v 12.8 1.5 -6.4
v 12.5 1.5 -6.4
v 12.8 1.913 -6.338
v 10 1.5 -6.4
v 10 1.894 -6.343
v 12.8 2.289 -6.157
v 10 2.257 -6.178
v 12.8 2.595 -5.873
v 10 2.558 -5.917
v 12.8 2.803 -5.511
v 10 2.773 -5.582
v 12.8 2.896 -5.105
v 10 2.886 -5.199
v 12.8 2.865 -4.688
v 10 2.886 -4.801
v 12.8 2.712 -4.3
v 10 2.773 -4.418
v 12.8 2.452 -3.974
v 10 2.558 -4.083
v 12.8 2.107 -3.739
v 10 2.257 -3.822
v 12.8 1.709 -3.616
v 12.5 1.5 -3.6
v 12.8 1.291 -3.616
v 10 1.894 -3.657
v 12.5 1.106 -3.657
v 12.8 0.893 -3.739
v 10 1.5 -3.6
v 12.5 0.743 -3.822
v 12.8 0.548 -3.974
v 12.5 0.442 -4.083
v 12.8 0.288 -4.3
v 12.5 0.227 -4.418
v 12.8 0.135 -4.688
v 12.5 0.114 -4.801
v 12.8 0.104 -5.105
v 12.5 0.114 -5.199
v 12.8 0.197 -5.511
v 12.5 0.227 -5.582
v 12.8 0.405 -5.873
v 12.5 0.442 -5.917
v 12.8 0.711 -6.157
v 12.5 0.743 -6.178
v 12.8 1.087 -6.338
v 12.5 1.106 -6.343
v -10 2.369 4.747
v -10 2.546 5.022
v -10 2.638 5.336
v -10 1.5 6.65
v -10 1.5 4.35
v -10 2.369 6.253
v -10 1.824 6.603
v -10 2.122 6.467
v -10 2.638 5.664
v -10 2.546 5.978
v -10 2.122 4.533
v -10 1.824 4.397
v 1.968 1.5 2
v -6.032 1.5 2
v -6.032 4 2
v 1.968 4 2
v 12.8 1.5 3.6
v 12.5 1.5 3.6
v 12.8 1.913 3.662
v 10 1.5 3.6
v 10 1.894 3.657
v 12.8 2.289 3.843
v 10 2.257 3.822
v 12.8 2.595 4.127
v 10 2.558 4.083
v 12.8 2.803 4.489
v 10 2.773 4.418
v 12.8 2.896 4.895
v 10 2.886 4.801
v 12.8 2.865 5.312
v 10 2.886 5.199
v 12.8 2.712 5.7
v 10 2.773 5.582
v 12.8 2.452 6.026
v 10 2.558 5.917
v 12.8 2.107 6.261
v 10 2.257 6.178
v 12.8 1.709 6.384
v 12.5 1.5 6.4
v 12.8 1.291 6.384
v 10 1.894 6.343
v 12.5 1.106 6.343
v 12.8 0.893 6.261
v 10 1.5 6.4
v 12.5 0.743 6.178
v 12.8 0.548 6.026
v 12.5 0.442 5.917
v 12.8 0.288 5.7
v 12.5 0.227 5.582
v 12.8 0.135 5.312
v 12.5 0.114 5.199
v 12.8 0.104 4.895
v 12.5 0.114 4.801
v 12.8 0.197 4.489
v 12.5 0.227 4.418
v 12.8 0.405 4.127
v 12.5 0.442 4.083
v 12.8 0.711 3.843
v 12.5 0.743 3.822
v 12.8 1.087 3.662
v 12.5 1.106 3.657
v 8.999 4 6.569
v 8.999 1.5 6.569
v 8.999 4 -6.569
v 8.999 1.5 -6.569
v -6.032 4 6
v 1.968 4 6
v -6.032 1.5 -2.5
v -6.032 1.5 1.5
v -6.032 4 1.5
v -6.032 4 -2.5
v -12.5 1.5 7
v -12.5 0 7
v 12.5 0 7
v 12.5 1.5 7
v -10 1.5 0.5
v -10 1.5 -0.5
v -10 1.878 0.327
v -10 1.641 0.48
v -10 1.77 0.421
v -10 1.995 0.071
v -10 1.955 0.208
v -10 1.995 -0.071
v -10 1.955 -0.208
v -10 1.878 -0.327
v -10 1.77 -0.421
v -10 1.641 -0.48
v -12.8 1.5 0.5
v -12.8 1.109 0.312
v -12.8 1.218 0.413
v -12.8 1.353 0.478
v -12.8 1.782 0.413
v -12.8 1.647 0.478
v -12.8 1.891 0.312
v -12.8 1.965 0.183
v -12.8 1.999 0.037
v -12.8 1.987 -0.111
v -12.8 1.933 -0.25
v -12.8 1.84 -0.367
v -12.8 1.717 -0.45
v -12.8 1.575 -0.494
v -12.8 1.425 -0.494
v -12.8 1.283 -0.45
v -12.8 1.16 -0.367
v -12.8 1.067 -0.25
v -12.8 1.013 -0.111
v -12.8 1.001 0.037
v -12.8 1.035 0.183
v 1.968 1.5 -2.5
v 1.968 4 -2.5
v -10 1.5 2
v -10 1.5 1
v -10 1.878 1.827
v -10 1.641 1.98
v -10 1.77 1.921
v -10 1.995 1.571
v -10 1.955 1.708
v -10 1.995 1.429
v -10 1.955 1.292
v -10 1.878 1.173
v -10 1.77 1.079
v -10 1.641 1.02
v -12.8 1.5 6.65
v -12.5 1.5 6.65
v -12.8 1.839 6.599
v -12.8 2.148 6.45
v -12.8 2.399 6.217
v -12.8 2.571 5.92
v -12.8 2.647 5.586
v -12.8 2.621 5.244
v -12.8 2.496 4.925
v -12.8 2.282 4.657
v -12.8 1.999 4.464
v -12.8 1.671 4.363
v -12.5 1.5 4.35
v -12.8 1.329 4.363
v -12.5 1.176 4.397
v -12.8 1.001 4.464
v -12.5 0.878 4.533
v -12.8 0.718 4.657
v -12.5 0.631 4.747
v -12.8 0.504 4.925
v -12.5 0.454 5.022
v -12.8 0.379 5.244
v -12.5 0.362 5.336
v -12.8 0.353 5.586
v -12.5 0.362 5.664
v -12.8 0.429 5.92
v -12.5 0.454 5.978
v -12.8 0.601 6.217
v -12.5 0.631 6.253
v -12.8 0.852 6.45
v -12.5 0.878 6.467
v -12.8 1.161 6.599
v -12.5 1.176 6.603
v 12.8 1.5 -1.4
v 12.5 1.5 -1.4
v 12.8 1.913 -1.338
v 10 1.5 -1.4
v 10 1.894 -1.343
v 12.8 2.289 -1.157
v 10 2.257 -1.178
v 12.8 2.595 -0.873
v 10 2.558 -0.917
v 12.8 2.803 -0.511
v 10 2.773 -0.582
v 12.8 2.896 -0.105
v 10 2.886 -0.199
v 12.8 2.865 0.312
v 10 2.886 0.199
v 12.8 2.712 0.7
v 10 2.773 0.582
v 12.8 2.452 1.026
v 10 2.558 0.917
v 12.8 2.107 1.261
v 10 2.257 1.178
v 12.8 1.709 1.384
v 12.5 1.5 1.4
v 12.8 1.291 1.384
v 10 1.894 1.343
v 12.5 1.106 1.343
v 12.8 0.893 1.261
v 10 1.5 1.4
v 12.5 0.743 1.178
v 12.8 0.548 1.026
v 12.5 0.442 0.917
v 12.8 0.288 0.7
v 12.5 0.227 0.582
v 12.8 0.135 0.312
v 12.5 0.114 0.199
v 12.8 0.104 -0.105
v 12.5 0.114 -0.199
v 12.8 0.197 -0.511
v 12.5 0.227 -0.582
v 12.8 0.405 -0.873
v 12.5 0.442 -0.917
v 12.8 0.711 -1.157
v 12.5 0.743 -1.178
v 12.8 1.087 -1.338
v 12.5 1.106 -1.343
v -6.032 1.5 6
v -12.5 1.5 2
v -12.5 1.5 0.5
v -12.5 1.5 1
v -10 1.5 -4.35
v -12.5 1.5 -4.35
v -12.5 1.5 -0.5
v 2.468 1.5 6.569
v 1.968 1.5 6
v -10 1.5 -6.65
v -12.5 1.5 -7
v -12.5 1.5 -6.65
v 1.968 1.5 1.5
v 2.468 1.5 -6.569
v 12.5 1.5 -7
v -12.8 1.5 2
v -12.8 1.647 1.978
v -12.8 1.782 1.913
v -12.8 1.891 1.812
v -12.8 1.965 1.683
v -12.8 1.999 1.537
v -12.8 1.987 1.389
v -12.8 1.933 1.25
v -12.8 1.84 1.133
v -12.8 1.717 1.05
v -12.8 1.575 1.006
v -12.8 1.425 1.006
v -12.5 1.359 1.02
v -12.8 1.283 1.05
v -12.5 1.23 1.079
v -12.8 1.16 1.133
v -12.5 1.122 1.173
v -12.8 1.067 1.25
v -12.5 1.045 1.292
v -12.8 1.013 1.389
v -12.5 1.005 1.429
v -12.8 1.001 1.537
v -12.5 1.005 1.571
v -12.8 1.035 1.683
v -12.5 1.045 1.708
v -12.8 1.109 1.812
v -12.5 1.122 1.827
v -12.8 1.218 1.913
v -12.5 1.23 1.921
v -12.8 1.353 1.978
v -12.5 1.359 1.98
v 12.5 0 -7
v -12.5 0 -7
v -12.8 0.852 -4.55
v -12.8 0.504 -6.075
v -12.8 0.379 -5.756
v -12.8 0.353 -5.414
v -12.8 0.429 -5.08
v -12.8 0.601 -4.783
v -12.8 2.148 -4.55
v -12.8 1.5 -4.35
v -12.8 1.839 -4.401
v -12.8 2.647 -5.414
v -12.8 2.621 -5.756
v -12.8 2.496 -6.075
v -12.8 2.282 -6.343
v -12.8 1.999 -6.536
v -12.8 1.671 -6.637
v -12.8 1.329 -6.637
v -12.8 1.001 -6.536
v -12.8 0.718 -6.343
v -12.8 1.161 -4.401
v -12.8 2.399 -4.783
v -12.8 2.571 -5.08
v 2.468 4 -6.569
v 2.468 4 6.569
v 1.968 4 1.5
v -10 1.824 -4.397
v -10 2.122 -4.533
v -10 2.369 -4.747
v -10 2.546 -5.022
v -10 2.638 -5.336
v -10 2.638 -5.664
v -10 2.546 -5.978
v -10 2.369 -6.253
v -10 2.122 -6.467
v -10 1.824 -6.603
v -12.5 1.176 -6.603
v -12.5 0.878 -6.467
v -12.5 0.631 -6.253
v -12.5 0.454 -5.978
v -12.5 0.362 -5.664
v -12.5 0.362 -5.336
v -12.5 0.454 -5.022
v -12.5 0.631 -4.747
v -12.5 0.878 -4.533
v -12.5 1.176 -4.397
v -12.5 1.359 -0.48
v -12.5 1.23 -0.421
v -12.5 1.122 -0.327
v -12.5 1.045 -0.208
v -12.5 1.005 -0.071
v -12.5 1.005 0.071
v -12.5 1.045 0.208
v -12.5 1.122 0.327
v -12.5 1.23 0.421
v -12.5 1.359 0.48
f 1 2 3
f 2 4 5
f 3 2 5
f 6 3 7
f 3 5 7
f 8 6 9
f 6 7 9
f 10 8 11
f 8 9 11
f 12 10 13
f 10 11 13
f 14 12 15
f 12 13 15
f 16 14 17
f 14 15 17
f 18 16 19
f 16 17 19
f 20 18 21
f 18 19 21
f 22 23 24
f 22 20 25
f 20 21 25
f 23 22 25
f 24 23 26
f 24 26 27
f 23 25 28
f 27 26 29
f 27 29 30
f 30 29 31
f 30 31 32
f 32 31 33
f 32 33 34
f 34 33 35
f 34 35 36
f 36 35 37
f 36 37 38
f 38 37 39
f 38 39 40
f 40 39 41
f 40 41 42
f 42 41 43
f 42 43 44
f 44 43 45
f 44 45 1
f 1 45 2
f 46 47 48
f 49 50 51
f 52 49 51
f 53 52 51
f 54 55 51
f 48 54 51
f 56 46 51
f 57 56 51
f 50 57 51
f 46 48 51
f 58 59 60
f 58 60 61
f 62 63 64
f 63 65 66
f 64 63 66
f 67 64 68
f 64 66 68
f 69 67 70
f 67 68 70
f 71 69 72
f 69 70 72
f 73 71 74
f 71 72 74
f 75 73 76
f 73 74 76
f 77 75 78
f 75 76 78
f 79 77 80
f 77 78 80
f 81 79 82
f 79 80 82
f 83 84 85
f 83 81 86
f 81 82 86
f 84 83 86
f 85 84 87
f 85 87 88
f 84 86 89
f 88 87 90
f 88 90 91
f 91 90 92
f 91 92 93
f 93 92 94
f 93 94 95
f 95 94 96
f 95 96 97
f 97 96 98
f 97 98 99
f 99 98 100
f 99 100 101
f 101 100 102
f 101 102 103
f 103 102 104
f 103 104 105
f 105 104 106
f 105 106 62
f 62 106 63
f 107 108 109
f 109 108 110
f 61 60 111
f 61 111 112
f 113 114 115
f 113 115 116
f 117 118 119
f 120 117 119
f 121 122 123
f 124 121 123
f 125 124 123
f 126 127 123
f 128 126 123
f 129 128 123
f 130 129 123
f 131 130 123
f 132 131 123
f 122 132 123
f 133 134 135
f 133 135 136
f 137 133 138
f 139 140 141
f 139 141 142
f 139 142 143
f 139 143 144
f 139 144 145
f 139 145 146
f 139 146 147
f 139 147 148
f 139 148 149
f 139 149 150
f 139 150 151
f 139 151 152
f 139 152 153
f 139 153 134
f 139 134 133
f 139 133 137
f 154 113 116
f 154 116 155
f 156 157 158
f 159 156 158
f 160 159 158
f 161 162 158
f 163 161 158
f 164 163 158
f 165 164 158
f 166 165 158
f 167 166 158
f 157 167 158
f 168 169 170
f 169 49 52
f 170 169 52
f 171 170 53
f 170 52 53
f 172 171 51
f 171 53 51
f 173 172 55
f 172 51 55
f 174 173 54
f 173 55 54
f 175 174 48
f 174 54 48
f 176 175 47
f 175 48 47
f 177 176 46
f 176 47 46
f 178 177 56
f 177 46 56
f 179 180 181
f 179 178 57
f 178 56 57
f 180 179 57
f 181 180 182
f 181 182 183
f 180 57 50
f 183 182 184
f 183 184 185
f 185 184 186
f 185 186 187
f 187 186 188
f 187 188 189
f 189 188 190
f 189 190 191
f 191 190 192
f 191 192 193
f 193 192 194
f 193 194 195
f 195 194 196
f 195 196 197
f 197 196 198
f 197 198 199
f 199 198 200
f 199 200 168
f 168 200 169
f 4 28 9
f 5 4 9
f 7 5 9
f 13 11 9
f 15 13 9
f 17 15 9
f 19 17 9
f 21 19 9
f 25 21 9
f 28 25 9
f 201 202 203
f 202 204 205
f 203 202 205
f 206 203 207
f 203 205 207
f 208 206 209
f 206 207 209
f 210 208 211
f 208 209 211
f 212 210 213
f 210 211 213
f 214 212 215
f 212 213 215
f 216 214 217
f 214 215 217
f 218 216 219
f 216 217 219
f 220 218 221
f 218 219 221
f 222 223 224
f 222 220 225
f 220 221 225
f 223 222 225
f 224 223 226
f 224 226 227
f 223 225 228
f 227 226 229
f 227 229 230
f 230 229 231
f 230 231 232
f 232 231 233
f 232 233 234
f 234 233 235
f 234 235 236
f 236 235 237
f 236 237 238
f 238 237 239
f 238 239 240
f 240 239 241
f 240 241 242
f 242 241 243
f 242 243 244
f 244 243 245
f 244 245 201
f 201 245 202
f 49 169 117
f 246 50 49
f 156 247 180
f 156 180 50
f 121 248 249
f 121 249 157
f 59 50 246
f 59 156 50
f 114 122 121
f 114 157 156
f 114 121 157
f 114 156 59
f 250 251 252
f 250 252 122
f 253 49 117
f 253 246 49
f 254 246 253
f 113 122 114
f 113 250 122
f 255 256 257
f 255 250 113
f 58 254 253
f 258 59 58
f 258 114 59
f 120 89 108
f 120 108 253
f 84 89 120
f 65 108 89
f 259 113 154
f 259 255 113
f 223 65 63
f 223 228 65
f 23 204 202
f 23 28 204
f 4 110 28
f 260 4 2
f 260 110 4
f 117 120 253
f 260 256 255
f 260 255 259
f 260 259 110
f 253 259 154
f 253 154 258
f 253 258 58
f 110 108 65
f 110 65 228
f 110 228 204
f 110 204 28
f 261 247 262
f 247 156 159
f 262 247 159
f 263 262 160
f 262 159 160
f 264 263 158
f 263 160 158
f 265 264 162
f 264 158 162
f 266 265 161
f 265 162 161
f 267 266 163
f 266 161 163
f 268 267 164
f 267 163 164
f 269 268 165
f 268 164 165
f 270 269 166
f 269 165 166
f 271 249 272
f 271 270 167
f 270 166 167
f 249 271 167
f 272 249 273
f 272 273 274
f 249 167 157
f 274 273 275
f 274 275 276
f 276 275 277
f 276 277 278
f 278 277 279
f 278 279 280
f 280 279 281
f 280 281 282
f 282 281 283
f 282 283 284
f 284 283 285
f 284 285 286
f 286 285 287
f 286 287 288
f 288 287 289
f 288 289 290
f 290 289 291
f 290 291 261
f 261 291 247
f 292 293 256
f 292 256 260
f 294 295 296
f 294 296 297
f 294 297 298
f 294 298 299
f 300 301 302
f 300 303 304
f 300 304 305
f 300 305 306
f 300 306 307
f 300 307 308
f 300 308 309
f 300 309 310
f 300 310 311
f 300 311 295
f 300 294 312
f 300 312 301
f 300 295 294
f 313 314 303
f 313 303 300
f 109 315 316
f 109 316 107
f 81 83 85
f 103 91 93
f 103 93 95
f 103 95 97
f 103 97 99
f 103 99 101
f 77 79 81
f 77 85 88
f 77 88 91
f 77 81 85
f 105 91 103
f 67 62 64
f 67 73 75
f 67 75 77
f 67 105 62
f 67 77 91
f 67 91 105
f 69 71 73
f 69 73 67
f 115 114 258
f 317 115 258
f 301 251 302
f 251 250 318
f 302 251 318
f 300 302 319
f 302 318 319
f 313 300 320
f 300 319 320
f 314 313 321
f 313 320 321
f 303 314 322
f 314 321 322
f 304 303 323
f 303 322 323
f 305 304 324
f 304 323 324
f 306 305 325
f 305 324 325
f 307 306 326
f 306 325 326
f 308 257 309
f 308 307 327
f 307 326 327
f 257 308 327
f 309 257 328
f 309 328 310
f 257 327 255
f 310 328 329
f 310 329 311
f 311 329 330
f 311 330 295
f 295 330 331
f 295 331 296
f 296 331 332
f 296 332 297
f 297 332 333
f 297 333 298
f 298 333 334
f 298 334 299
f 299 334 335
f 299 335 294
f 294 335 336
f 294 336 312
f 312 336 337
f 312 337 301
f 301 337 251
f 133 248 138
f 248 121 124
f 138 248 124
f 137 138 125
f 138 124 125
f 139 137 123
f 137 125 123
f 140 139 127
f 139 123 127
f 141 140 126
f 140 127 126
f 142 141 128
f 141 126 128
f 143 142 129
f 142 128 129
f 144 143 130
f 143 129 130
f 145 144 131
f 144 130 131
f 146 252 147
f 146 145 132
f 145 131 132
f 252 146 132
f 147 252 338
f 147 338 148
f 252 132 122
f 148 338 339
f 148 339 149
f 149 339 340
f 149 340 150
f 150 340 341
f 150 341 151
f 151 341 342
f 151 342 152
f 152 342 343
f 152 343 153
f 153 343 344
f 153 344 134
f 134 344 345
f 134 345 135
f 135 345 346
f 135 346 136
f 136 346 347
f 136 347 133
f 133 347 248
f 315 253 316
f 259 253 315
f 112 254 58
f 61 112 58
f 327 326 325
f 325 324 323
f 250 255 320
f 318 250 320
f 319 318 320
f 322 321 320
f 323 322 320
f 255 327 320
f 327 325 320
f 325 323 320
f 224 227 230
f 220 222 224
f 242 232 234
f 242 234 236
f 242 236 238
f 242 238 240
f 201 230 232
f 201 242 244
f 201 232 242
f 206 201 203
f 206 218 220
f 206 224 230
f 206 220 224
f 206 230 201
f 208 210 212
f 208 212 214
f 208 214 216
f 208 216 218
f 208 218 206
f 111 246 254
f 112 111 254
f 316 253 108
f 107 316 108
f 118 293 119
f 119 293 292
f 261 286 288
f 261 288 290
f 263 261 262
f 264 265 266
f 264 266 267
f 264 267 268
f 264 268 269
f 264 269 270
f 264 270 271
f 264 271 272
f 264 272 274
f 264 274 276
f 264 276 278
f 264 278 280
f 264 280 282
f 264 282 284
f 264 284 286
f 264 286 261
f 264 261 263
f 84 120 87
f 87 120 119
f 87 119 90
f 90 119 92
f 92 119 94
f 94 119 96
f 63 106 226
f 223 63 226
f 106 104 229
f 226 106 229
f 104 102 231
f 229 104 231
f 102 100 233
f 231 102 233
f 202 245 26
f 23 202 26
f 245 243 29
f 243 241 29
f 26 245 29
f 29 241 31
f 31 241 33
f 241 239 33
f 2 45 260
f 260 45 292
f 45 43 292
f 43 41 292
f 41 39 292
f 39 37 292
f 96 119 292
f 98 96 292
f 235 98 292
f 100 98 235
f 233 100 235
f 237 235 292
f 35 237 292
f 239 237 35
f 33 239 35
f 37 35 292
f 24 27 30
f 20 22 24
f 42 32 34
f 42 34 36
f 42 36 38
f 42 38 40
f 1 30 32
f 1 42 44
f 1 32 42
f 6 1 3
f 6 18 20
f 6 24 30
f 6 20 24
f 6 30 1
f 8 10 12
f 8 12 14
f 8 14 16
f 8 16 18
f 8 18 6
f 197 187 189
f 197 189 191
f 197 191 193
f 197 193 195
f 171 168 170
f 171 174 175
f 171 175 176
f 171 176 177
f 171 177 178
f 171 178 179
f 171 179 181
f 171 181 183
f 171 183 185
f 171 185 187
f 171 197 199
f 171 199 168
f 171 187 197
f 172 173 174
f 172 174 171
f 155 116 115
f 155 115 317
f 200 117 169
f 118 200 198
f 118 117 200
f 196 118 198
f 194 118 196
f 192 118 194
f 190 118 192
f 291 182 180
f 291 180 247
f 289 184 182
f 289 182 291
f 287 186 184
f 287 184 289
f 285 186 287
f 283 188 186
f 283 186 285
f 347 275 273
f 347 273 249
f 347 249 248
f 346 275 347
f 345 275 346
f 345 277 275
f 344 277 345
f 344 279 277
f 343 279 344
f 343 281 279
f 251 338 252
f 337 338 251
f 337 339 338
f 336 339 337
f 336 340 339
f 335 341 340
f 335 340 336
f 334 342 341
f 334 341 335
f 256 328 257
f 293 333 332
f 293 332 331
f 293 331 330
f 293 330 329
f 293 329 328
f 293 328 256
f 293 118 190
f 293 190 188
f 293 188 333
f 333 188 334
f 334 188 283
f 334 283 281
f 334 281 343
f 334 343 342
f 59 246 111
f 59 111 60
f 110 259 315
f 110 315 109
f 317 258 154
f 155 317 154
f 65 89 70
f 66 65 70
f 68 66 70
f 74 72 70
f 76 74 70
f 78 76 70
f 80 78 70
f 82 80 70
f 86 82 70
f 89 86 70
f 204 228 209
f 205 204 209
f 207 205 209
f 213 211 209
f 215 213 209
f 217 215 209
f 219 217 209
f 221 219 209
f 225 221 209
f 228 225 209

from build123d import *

# Parameters (mm, degrees)
SKIZZE1_W            = 25
SKIZZE1_H            = 14
PLATINE_DEPTH        = 1.5
SKIZZE2_W            = 6.530722005
SKIZZE2_H            = 13.138578522
MOSFETS_DEPTH        = 2.5
SKIZZE4_W            = 8
SKIZZE4_H            = 4
WEITERE_ICS_DEPTH    = 2.5
LOT_MOTOR_DEPTH      = 0.3
LOT_MOTOR_DEPTH_BACK = 2.5
SKIZZE5_R            = 1.4
LOT_PDB_DEPTH        = 0.3
LOT_PDB_DEPTH_BACK   = 2.5
SKIZZE6_R            = 1.15
LOT_FC_DEPTH         = 0.3
LOT_FC_DEPTH_BACK    = 2.5
SKIZZE7_R            = 0.5


with BuildPart() as part:
    # Skizze1 → Platine (new body)
    with BuildSketch(Plane(origin=(0, 0, 0), x_dir=(1, 0, 0), z_dir=(0, 1, 0))):
        Rectangle(SKIZZE1_W, SKIZZE1_H)
    extrude(amount=PLATINE_DEPTH)

    # Skizze2 → MOSFETs (add)
    with BuildSketch(Plane(origin=(0, 1.5, 0), x_dir=(1, 0, 0), z_dir=(0, 1, 0))):
        with Locations((5.733665382, 0)):
            Rectangle(SKIZZE2_W, SKIZZE2_H)
    extrude(amount=MOSFETS_DEPTH)

    # Skizze4 → Weitere_ICs (add)
    with BuildSketch(Plane(origin=(0, 1.5, 0), x_dir=(1, 0, 0), z_dir=(0, 1, 0))):
        with Locations((-2.03169562, -4)):
            Rectangle(SKIZZE4_W, SKIZZE4_H)
        with Locations((-2.03169562, 0.5)):
            Rectangle(SKIZZE4_W, SKIZZE4_H)
    extrude(amount=WEITERE_ICS_DEPTH)

    # Skizze5 → Lot_Motor (add, two sides: drawn at the far end of the back side and taken through both)
    with BuildSketch(Plane(origin=(12.5, 0, 0), x_dir=(0, 0, -1), z_dir=(1, 0, 0)).offset(-LOT_MOTOR_DEPTH_BACK)):
        with Locations((-5, 1.5)):
            Circle(SKIZZE5_R)
        with Locations((0, 1.5)):
            Circle(SKIZZE5_R)
        with Locations((5, 1.5)):
            Circle(SKIZZE5_R)
    extrude(amount=LOT_MOTOR_DEPTH + LOT_MOTOR_DEPTH_BACK)

    # Skizze6 → Lot_PDB (add, two sides: drawn at the far end of the back side and taken through both)
    with BuildSketch(Plane.ZY.offset(12.5).offset(-LOT_PDB_DEPTH_BACK)):
        with Locations((-5.5, 1.5)):
            Circle(SKIZZE6_R)
        with Locations((5.5, 1.5)):
            Circle(SKIZZE6_R)
    extrude(amount=LOT_PDB_DEPTH + LOT_PDB_DEPTH_BACK)

    # Skizze7 → Lot_FC (add, two sides: drawn at the far end of the back side and taken through both)
    with BuildSketch(Plane.ZY.offset(12.5).offset(-LOT_FC_DEPTH_BACK)):
        with Locations((1.5, 1.5)):
            Circle(SKIZZE7_R)
        with Locations((0, 1.5)):
            Circle(SKIZZE7_R)
    extrude(amount=LOT_FC_DEPTH + LOT_FC_DEPTH_BACK)


solid = part.part
